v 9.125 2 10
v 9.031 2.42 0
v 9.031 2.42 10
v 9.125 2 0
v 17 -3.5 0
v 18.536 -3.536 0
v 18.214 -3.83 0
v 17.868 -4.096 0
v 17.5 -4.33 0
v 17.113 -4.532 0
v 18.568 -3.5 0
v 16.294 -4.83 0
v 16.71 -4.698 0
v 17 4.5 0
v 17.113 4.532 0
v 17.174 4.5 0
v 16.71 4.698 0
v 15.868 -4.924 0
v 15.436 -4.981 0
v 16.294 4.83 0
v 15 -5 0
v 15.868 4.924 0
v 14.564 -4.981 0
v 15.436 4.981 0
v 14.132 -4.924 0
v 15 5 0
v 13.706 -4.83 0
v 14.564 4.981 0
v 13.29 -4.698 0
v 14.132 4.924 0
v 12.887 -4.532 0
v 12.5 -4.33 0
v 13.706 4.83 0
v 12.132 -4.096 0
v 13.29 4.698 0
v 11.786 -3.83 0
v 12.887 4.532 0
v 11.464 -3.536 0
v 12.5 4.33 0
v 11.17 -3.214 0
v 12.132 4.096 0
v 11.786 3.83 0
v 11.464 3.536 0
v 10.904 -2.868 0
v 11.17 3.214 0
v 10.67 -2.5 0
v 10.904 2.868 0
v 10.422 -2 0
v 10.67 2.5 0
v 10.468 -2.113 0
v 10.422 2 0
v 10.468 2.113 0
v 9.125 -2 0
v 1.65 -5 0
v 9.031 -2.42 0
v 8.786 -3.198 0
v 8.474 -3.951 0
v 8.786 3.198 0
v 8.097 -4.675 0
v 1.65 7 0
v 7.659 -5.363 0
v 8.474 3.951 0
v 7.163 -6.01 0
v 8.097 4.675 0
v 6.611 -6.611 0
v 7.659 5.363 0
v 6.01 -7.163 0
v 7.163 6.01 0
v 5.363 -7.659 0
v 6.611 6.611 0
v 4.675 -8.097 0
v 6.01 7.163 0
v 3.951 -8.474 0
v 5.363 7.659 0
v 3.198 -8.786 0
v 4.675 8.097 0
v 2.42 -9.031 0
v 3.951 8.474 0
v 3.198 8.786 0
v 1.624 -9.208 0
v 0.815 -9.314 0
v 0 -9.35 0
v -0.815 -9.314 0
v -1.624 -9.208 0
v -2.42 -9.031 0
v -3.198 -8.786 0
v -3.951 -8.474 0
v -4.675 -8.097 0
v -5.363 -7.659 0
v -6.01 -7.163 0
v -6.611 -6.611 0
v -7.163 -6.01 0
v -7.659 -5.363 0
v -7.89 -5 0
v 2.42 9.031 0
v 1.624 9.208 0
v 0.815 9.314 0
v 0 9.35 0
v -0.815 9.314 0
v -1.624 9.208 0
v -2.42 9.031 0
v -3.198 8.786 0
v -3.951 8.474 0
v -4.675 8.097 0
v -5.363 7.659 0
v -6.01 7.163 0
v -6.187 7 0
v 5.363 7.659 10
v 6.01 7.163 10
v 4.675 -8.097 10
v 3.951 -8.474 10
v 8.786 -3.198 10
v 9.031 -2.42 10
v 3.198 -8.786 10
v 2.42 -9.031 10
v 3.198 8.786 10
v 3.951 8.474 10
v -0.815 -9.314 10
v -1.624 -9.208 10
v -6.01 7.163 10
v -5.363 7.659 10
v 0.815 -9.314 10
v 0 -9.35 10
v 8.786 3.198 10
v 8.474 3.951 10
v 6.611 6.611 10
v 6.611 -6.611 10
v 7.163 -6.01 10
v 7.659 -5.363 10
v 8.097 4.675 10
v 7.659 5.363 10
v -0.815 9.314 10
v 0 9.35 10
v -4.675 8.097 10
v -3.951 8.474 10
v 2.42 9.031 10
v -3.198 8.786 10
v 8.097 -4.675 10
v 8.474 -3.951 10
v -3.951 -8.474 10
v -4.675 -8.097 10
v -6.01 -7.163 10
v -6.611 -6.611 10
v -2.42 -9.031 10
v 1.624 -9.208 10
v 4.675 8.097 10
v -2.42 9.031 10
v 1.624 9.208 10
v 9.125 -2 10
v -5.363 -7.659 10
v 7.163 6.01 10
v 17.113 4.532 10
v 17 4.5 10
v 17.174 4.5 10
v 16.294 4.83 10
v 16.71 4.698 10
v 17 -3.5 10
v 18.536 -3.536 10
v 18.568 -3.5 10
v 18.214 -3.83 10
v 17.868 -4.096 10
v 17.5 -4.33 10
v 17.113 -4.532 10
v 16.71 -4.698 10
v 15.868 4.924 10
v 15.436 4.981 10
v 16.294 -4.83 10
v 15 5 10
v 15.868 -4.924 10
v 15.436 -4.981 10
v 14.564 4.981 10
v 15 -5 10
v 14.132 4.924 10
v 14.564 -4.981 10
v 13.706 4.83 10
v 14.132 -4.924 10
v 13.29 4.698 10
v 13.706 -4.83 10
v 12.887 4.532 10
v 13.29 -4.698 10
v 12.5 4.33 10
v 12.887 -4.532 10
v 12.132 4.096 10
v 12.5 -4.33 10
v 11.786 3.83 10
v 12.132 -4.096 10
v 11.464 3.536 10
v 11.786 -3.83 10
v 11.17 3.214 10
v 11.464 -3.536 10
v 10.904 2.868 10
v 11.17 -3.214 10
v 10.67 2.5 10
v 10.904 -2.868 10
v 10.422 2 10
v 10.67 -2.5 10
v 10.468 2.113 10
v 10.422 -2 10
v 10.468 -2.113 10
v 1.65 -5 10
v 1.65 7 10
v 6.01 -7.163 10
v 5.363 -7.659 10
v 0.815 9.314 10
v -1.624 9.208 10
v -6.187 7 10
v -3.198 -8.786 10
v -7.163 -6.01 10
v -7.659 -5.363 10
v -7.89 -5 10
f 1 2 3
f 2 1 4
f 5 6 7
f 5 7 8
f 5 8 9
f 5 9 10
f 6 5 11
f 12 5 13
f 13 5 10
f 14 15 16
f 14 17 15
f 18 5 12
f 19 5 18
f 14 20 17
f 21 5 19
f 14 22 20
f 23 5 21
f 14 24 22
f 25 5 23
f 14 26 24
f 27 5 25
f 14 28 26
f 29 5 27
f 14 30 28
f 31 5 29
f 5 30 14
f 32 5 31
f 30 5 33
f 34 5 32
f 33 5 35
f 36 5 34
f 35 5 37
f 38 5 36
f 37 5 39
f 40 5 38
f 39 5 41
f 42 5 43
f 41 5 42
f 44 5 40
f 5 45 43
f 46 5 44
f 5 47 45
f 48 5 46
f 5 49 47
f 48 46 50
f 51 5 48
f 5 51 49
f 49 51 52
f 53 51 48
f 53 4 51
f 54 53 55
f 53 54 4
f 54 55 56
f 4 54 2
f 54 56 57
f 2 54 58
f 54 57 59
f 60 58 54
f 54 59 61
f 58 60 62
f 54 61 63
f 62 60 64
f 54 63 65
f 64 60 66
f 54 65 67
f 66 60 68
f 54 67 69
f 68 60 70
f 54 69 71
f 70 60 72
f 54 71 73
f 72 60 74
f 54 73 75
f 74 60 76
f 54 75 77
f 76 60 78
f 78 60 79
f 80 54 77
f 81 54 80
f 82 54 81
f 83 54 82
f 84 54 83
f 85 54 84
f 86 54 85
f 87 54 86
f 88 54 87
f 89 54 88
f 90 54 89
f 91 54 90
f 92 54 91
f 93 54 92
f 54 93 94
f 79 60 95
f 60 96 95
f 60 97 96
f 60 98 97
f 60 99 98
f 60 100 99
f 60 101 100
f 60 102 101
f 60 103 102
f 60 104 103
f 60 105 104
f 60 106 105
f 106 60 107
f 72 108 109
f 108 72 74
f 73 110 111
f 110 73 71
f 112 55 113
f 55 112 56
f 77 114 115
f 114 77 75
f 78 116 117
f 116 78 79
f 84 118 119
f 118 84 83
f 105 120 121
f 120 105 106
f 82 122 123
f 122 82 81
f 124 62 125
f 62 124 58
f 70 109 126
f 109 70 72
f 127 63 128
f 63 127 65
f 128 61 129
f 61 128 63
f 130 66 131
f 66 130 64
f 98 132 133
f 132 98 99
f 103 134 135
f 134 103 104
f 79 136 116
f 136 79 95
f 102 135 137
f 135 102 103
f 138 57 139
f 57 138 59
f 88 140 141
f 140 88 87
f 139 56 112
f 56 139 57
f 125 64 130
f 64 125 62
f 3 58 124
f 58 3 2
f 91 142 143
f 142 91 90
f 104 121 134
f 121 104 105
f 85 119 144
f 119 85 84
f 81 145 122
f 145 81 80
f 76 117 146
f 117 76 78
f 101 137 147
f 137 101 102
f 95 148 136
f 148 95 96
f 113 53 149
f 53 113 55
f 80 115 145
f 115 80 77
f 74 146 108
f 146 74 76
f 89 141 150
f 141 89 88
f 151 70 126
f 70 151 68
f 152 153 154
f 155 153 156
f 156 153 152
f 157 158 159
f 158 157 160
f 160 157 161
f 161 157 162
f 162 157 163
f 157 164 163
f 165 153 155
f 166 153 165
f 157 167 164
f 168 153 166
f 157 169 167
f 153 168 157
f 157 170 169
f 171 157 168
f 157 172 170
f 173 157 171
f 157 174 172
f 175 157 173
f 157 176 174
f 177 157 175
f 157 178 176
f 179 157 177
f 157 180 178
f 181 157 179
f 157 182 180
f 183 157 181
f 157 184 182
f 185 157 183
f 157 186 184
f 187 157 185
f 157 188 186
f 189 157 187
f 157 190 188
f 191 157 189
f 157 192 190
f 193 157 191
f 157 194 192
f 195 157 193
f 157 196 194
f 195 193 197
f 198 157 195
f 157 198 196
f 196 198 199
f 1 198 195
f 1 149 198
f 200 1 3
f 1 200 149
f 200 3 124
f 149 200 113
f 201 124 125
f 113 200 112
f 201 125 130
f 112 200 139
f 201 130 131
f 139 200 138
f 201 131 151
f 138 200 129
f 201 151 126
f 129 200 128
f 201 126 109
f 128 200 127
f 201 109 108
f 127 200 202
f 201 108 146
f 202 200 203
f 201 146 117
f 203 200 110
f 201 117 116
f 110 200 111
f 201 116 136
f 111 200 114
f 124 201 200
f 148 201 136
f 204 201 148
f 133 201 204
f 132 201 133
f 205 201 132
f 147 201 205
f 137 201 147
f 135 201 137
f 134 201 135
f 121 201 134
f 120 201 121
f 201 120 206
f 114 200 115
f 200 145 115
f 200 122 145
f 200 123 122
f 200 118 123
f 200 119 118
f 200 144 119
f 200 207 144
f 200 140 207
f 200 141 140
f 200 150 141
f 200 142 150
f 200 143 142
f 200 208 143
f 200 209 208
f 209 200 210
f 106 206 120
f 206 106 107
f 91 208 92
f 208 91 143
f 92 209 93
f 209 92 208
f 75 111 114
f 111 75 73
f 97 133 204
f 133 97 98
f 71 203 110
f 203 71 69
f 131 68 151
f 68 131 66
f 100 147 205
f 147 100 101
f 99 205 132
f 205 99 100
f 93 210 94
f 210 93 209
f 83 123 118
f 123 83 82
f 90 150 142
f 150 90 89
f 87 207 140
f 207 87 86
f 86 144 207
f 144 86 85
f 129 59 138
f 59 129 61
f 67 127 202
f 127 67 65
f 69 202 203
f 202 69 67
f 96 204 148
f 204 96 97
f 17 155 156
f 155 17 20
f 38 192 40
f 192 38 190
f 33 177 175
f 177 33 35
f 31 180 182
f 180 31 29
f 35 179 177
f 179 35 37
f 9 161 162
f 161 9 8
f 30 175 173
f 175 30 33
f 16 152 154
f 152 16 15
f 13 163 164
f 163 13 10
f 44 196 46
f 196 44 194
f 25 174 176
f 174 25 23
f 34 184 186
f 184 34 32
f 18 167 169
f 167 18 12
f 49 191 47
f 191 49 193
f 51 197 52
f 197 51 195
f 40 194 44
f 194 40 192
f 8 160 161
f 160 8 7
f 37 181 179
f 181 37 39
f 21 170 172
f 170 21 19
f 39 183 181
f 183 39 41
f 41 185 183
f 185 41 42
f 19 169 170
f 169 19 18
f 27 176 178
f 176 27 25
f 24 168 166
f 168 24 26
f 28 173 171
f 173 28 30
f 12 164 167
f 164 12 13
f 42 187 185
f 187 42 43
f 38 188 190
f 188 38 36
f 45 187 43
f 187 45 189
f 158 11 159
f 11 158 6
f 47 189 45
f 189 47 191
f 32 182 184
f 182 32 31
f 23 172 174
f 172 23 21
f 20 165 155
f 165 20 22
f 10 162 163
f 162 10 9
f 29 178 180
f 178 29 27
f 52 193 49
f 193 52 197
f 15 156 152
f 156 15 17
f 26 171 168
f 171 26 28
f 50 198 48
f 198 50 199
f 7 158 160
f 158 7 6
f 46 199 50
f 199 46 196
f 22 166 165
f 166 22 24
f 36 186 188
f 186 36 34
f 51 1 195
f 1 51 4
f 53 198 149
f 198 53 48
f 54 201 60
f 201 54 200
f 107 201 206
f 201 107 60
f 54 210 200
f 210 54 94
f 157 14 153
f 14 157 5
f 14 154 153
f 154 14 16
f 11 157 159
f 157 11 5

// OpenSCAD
// Stand rod and tubing clip - prints flat, snaps onto a 12.7 mm stand rod and holds a
// small tube next to it. NOVEL general part.
//

rod_d     = 12.7;
ring_w    = 3;
outer_d   = rod_d + 2 * ring_w;
opening_w = 10;
bridge_x1 = 8;
bridge_x2 = 12;
bridge_w  = bridge_x2 - bridge_x1;
tube_d    = 6;
tube_w    = 2;
tube_x    = 15;
cut_x     = tube_x + tube_w;
cut_y     = tube_d / 2 + 0.5;
height    = 10;

$fn = 72;

difference() {
    union() {
        // Stand-rod ring
        cylinder(h = height, d = outer_d);
        // Tubing ring
        translate([tube_x, 0, 0]) cylinder(h = height, d = tube_d + 2 * tube_w);
        // Solid bridge
        translate([bridge_x1, -bridge_w / 2, 0]) cube([bridge_w, bridge_w, height]);
    }
    // Opening in the rod ring
    translate([-outer_d / 2 - 1, -opening_w / 2, 0])
        cube([opening_w + 2, opening_w + 2, height + 2]);
    // Opening in the tubing ring
    translate([cut_x, -cut_y, 0])
        cube([tube_w + 1, 2 * cut_y + 1, height + 2]);
}
